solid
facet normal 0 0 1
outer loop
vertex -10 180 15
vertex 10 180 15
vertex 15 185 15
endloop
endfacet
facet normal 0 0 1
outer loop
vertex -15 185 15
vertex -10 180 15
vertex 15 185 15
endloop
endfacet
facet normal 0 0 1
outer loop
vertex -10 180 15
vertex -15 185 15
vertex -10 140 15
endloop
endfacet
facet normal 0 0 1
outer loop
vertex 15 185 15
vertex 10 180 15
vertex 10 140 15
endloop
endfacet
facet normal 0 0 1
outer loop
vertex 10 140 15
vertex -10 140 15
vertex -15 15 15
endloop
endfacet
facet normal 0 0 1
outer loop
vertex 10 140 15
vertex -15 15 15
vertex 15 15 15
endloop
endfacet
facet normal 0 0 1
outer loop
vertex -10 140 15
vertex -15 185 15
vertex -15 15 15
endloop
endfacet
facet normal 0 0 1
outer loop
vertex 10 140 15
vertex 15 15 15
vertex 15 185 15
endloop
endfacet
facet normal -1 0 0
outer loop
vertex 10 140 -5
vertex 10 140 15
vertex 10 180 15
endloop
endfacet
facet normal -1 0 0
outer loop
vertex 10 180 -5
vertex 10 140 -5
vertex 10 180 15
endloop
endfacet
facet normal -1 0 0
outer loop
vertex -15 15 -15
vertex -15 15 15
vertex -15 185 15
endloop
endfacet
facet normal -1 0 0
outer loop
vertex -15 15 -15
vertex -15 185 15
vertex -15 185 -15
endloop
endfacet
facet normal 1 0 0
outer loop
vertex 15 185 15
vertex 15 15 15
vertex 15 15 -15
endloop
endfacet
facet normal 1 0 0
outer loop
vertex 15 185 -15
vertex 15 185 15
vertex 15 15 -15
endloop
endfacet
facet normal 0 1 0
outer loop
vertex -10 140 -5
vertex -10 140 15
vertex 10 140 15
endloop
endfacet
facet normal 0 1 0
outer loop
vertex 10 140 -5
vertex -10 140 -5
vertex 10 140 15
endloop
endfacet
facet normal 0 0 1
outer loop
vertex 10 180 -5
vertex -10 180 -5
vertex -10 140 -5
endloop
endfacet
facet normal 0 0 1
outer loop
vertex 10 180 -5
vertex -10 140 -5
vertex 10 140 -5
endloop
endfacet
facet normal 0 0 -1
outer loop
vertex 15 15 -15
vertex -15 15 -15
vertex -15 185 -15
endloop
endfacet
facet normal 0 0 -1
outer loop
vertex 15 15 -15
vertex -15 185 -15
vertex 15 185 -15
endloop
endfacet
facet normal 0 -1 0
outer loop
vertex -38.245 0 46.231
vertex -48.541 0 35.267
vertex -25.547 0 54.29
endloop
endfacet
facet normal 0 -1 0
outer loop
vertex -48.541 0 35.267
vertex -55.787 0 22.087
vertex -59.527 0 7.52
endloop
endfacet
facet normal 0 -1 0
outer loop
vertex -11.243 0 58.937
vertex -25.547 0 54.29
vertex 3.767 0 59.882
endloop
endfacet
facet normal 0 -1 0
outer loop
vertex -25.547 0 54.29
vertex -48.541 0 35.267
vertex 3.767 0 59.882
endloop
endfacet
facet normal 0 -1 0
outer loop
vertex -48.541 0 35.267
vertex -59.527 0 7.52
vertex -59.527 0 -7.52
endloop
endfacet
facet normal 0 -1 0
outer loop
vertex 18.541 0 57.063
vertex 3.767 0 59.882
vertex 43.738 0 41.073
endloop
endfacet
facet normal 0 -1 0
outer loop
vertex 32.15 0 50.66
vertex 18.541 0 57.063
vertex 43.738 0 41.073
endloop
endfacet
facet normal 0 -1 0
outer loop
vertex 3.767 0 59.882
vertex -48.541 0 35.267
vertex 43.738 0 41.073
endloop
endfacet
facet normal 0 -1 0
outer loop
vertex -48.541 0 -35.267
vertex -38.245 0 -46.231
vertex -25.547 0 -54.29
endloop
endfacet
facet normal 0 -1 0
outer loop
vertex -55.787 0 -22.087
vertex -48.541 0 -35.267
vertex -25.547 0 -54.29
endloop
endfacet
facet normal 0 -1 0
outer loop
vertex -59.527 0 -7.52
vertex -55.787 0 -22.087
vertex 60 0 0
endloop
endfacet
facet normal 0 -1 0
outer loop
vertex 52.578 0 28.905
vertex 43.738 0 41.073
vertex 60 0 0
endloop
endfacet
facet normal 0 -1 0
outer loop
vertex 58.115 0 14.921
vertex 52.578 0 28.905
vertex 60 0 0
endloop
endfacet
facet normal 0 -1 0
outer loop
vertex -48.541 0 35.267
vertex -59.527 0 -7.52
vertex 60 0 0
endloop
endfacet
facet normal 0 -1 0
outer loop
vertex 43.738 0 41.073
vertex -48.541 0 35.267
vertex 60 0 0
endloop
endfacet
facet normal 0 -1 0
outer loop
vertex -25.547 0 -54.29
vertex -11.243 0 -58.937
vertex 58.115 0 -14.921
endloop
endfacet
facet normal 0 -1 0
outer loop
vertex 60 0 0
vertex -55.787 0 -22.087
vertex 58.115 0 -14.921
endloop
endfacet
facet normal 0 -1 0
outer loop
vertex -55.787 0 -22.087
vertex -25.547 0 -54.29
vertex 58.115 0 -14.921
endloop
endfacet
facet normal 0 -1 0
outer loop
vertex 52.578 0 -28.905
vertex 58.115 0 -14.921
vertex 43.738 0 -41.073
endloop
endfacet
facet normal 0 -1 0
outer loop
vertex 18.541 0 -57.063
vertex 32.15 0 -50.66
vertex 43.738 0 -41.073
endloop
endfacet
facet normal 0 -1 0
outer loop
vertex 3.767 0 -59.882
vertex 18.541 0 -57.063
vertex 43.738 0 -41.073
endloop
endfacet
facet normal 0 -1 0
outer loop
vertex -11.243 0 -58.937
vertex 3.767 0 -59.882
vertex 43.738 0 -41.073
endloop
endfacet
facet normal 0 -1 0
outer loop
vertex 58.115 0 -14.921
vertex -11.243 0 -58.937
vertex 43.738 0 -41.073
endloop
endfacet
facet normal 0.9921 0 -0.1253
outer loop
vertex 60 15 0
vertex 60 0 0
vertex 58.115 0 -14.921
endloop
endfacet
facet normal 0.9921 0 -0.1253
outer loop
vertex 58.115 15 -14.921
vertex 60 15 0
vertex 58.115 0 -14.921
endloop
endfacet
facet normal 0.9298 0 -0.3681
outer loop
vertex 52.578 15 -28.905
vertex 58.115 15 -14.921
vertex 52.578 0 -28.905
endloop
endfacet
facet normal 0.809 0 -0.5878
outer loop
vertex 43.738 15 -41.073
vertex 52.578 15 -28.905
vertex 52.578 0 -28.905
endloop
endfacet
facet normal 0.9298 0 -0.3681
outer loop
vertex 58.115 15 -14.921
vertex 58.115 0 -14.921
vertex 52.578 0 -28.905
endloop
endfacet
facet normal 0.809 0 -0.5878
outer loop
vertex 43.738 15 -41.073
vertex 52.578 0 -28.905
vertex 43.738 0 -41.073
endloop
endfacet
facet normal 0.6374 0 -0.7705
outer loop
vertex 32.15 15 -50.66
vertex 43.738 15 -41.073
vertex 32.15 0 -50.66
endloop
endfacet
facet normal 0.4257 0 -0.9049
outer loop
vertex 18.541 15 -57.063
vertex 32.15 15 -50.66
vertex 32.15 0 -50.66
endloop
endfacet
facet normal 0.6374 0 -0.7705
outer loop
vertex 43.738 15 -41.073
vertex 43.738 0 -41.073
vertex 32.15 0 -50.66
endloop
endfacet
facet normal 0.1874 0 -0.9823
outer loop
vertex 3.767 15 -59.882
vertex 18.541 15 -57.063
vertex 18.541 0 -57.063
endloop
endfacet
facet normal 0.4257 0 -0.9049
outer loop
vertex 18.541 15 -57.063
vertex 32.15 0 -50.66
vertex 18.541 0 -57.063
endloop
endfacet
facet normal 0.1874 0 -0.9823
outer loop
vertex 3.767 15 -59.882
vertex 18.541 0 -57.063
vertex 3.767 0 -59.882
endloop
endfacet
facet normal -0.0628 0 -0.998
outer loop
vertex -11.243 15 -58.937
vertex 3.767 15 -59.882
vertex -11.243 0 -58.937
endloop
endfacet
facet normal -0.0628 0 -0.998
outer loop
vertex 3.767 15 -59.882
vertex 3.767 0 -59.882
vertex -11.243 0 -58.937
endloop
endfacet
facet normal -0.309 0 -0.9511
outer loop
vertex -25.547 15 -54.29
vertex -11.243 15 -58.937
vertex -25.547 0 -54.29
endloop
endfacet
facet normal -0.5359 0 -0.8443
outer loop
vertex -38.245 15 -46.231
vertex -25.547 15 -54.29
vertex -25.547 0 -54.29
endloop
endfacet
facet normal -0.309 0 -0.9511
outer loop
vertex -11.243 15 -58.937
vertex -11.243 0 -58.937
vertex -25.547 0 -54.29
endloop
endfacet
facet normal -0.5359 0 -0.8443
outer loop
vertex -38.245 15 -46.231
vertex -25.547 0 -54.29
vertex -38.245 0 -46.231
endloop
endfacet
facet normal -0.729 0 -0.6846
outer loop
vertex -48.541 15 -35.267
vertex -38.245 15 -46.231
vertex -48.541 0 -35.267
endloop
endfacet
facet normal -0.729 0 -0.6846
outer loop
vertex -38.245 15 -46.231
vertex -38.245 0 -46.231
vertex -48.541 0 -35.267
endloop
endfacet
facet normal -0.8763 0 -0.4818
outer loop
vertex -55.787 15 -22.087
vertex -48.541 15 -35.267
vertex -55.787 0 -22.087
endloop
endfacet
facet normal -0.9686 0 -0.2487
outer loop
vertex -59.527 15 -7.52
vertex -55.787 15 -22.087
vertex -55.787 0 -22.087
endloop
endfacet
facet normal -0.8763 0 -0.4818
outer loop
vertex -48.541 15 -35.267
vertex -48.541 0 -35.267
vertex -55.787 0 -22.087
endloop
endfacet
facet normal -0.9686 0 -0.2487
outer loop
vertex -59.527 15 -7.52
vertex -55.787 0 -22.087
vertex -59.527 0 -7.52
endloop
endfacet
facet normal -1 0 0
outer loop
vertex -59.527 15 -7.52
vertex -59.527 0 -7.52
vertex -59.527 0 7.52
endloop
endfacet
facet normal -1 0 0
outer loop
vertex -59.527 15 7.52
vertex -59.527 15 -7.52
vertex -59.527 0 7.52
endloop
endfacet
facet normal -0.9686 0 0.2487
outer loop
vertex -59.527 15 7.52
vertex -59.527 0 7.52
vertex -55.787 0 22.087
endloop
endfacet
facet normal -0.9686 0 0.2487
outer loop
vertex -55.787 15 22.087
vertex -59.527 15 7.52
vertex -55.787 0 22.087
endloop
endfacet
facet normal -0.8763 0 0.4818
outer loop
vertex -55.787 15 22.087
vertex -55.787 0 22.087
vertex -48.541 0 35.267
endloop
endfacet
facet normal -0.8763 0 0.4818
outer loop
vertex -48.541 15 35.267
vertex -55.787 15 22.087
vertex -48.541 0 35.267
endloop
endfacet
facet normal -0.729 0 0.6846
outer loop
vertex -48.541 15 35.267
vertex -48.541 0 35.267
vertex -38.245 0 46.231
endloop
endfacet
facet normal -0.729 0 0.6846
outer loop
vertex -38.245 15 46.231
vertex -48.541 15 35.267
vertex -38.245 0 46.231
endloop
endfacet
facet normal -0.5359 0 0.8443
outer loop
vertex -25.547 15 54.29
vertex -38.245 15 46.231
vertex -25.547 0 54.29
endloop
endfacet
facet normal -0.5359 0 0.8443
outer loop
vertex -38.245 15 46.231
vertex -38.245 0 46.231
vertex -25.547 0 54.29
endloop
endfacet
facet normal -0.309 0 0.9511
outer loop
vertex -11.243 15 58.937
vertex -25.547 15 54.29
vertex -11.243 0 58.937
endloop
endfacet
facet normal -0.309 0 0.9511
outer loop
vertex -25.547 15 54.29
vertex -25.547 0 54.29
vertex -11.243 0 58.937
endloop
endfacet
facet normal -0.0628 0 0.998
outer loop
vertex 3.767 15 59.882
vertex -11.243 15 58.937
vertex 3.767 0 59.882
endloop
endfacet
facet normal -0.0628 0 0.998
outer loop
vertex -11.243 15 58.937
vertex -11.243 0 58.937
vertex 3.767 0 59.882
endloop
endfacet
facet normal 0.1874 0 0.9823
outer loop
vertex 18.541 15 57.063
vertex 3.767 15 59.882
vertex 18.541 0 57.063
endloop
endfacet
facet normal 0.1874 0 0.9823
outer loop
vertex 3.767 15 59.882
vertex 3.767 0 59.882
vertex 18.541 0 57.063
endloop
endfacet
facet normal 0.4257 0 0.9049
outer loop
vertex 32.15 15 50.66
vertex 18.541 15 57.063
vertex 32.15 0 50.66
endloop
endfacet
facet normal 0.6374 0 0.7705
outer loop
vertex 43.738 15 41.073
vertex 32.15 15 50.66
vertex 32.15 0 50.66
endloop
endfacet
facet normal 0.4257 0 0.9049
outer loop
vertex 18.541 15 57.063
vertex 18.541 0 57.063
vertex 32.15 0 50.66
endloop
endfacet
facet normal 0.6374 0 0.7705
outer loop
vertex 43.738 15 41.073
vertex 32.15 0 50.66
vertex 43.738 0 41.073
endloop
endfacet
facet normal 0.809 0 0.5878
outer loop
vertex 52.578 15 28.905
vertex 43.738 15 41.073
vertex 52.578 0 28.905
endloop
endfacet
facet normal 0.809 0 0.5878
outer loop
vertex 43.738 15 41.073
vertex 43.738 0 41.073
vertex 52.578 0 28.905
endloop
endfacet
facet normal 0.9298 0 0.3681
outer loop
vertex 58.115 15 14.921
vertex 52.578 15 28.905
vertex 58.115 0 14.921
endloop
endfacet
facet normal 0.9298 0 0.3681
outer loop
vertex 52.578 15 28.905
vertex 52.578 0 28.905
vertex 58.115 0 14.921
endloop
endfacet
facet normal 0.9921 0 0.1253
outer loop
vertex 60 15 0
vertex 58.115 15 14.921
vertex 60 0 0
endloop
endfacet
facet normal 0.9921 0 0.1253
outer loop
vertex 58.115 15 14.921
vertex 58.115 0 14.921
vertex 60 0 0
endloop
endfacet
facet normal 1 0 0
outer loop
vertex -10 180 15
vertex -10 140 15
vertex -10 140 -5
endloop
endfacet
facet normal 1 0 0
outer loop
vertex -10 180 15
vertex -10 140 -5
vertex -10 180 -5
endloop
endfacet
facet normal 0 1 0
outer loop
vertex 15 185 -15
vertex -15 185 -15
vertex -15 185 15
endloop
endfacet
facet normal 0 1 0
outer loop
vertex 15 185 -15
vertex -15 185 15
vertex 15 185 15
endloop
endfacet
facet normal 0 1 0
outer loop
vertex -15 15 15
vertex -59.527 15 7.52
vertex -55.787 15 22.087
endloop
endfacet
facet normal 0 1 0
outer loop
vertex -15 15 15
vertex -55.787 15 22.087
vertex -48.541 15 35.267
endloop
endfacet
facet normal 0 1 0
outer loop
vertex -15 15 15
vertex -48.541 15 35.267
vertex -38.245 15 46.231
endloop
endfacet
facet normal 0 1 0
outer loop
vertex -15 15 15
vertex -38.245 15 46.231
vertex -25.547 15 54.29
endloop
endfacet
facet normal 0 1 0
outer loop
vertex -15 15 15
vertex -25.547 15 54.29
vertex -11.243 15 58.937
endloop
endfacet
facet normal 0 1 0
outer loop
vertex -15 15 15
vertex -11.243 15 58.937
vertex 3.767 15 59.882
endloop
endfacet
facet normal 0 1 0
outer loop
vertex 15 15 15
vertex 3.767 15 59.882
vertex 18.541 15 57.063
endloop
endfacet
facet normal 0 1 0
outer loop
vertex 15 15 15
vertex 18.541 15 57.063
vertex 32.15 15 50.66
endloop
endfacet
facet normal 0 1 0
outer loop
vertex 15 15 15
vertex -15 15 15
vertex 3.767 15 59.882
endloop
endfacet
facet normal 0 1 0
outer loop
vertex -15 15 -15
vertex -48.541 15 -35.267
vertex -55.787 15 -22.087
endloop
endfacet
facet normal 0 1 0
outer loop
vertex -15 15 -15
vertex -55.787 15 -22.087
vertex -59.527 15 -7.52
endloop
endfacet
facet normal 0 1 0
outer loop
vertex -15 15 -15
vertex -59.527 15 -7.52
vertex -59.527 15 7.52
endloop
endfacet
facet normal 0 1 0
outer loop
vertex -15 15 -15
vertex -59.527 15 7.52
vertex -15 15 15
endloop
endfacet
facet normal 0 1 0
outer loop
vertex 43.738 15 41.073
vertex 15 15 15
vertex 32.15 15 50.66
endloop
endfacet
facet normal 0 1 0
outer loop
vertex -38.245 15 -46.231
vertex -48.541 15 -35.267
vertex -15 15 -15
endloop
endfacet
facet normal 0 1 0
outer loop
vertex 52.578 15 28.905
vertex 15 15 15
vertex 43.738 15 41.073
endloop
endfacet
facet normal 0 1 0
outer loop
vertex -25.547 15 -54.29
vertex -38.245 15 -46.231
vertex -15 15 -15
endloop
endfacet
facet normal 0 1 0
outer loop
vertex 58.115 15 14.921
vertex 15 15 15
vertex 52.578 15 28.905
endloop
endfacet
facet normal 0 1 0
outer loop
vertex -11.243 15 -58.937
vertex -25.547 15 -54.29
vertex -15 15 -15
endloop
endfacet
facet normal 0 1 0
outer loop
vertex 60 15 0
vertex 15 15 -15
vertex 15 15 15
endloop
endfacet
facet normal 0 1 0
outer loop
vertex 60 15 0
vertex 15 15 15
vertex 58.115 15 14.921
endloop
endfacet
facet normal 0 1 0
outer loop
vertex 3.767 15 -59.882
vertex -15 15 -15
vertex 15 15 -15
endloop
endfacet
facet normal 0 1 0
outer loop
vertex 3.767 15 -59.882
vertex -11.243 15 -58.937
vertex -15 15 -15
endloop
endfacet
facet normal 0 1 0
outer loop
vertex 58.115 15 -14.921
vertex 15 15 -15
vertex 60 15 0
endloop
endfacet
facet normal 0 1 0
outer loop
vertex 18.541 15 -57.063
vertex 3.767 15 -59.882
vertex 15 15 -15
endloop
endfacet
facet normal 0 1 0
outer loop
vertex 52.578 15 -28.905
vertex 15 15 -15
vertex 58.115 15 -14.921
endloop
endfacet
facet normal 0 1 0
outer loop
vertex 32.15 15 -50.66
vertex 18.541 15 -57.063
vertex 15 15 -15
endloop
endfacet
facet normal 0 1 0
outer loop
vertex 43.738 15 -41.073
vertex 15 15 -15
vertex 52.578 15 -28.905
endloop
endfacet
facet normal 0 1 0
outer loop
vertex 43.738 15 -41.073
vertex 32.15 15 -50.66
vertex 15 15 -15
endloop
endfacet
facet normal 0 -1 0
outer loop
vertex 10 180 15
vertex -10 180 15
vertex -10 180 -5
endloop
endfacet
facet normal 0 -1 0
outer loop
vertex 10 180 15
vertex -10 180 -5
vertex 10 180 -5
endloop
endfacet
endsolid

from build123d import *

# Parameters (mm, degrees)
SKETCH1_R           = 60
BOSS_EXTRUDE1_DEPTH = 15
SKETCH3_W           = 30
SKETCH3_H           = 30
BOSS_EXTRUDE2_DEPTH = 170
SKETCH4_W           = 20
SKETCH4_H           = 40
CUT_EXTRUDE1_DEPTH  = 20


with BuildPart() as part:
    # Sketch1 → Boss-Extrude1 (new body)
    with BuildSketch(Plane(origin=(0, 0, 0), x_dir=(1, 0, 0), z_dir=(0, 1, 0))):
        Circle(SKETCH1_R)
    extrude(amount=BOSS_EXTRUDE1_DEPTH)

    # Sketch3 → Boss-Extrude2 (add)
    with BuildSketch(Plane(origin=(0, 15, 0), x_dir=(1, 0, 0), z_dir=(0, 1, 0))):
        Rectangle(SKETCH3_W, SKETCH3_H)
    extrude(amount=BOSS_EXTRUDE2_DEPTH)

    # Sketch4 → Cut-Extrude1 (cut)
    with BuildSketch(Plane.XY.offset(15)):
        with Locations((0, 160)):
            Rectangle(SKETCH4_W, SKETCH4_H)
    extrude(amount=-CUT_EXTRUDE1_DEPTH, mode=Mode.SUBTRACT)


solid = part.part
